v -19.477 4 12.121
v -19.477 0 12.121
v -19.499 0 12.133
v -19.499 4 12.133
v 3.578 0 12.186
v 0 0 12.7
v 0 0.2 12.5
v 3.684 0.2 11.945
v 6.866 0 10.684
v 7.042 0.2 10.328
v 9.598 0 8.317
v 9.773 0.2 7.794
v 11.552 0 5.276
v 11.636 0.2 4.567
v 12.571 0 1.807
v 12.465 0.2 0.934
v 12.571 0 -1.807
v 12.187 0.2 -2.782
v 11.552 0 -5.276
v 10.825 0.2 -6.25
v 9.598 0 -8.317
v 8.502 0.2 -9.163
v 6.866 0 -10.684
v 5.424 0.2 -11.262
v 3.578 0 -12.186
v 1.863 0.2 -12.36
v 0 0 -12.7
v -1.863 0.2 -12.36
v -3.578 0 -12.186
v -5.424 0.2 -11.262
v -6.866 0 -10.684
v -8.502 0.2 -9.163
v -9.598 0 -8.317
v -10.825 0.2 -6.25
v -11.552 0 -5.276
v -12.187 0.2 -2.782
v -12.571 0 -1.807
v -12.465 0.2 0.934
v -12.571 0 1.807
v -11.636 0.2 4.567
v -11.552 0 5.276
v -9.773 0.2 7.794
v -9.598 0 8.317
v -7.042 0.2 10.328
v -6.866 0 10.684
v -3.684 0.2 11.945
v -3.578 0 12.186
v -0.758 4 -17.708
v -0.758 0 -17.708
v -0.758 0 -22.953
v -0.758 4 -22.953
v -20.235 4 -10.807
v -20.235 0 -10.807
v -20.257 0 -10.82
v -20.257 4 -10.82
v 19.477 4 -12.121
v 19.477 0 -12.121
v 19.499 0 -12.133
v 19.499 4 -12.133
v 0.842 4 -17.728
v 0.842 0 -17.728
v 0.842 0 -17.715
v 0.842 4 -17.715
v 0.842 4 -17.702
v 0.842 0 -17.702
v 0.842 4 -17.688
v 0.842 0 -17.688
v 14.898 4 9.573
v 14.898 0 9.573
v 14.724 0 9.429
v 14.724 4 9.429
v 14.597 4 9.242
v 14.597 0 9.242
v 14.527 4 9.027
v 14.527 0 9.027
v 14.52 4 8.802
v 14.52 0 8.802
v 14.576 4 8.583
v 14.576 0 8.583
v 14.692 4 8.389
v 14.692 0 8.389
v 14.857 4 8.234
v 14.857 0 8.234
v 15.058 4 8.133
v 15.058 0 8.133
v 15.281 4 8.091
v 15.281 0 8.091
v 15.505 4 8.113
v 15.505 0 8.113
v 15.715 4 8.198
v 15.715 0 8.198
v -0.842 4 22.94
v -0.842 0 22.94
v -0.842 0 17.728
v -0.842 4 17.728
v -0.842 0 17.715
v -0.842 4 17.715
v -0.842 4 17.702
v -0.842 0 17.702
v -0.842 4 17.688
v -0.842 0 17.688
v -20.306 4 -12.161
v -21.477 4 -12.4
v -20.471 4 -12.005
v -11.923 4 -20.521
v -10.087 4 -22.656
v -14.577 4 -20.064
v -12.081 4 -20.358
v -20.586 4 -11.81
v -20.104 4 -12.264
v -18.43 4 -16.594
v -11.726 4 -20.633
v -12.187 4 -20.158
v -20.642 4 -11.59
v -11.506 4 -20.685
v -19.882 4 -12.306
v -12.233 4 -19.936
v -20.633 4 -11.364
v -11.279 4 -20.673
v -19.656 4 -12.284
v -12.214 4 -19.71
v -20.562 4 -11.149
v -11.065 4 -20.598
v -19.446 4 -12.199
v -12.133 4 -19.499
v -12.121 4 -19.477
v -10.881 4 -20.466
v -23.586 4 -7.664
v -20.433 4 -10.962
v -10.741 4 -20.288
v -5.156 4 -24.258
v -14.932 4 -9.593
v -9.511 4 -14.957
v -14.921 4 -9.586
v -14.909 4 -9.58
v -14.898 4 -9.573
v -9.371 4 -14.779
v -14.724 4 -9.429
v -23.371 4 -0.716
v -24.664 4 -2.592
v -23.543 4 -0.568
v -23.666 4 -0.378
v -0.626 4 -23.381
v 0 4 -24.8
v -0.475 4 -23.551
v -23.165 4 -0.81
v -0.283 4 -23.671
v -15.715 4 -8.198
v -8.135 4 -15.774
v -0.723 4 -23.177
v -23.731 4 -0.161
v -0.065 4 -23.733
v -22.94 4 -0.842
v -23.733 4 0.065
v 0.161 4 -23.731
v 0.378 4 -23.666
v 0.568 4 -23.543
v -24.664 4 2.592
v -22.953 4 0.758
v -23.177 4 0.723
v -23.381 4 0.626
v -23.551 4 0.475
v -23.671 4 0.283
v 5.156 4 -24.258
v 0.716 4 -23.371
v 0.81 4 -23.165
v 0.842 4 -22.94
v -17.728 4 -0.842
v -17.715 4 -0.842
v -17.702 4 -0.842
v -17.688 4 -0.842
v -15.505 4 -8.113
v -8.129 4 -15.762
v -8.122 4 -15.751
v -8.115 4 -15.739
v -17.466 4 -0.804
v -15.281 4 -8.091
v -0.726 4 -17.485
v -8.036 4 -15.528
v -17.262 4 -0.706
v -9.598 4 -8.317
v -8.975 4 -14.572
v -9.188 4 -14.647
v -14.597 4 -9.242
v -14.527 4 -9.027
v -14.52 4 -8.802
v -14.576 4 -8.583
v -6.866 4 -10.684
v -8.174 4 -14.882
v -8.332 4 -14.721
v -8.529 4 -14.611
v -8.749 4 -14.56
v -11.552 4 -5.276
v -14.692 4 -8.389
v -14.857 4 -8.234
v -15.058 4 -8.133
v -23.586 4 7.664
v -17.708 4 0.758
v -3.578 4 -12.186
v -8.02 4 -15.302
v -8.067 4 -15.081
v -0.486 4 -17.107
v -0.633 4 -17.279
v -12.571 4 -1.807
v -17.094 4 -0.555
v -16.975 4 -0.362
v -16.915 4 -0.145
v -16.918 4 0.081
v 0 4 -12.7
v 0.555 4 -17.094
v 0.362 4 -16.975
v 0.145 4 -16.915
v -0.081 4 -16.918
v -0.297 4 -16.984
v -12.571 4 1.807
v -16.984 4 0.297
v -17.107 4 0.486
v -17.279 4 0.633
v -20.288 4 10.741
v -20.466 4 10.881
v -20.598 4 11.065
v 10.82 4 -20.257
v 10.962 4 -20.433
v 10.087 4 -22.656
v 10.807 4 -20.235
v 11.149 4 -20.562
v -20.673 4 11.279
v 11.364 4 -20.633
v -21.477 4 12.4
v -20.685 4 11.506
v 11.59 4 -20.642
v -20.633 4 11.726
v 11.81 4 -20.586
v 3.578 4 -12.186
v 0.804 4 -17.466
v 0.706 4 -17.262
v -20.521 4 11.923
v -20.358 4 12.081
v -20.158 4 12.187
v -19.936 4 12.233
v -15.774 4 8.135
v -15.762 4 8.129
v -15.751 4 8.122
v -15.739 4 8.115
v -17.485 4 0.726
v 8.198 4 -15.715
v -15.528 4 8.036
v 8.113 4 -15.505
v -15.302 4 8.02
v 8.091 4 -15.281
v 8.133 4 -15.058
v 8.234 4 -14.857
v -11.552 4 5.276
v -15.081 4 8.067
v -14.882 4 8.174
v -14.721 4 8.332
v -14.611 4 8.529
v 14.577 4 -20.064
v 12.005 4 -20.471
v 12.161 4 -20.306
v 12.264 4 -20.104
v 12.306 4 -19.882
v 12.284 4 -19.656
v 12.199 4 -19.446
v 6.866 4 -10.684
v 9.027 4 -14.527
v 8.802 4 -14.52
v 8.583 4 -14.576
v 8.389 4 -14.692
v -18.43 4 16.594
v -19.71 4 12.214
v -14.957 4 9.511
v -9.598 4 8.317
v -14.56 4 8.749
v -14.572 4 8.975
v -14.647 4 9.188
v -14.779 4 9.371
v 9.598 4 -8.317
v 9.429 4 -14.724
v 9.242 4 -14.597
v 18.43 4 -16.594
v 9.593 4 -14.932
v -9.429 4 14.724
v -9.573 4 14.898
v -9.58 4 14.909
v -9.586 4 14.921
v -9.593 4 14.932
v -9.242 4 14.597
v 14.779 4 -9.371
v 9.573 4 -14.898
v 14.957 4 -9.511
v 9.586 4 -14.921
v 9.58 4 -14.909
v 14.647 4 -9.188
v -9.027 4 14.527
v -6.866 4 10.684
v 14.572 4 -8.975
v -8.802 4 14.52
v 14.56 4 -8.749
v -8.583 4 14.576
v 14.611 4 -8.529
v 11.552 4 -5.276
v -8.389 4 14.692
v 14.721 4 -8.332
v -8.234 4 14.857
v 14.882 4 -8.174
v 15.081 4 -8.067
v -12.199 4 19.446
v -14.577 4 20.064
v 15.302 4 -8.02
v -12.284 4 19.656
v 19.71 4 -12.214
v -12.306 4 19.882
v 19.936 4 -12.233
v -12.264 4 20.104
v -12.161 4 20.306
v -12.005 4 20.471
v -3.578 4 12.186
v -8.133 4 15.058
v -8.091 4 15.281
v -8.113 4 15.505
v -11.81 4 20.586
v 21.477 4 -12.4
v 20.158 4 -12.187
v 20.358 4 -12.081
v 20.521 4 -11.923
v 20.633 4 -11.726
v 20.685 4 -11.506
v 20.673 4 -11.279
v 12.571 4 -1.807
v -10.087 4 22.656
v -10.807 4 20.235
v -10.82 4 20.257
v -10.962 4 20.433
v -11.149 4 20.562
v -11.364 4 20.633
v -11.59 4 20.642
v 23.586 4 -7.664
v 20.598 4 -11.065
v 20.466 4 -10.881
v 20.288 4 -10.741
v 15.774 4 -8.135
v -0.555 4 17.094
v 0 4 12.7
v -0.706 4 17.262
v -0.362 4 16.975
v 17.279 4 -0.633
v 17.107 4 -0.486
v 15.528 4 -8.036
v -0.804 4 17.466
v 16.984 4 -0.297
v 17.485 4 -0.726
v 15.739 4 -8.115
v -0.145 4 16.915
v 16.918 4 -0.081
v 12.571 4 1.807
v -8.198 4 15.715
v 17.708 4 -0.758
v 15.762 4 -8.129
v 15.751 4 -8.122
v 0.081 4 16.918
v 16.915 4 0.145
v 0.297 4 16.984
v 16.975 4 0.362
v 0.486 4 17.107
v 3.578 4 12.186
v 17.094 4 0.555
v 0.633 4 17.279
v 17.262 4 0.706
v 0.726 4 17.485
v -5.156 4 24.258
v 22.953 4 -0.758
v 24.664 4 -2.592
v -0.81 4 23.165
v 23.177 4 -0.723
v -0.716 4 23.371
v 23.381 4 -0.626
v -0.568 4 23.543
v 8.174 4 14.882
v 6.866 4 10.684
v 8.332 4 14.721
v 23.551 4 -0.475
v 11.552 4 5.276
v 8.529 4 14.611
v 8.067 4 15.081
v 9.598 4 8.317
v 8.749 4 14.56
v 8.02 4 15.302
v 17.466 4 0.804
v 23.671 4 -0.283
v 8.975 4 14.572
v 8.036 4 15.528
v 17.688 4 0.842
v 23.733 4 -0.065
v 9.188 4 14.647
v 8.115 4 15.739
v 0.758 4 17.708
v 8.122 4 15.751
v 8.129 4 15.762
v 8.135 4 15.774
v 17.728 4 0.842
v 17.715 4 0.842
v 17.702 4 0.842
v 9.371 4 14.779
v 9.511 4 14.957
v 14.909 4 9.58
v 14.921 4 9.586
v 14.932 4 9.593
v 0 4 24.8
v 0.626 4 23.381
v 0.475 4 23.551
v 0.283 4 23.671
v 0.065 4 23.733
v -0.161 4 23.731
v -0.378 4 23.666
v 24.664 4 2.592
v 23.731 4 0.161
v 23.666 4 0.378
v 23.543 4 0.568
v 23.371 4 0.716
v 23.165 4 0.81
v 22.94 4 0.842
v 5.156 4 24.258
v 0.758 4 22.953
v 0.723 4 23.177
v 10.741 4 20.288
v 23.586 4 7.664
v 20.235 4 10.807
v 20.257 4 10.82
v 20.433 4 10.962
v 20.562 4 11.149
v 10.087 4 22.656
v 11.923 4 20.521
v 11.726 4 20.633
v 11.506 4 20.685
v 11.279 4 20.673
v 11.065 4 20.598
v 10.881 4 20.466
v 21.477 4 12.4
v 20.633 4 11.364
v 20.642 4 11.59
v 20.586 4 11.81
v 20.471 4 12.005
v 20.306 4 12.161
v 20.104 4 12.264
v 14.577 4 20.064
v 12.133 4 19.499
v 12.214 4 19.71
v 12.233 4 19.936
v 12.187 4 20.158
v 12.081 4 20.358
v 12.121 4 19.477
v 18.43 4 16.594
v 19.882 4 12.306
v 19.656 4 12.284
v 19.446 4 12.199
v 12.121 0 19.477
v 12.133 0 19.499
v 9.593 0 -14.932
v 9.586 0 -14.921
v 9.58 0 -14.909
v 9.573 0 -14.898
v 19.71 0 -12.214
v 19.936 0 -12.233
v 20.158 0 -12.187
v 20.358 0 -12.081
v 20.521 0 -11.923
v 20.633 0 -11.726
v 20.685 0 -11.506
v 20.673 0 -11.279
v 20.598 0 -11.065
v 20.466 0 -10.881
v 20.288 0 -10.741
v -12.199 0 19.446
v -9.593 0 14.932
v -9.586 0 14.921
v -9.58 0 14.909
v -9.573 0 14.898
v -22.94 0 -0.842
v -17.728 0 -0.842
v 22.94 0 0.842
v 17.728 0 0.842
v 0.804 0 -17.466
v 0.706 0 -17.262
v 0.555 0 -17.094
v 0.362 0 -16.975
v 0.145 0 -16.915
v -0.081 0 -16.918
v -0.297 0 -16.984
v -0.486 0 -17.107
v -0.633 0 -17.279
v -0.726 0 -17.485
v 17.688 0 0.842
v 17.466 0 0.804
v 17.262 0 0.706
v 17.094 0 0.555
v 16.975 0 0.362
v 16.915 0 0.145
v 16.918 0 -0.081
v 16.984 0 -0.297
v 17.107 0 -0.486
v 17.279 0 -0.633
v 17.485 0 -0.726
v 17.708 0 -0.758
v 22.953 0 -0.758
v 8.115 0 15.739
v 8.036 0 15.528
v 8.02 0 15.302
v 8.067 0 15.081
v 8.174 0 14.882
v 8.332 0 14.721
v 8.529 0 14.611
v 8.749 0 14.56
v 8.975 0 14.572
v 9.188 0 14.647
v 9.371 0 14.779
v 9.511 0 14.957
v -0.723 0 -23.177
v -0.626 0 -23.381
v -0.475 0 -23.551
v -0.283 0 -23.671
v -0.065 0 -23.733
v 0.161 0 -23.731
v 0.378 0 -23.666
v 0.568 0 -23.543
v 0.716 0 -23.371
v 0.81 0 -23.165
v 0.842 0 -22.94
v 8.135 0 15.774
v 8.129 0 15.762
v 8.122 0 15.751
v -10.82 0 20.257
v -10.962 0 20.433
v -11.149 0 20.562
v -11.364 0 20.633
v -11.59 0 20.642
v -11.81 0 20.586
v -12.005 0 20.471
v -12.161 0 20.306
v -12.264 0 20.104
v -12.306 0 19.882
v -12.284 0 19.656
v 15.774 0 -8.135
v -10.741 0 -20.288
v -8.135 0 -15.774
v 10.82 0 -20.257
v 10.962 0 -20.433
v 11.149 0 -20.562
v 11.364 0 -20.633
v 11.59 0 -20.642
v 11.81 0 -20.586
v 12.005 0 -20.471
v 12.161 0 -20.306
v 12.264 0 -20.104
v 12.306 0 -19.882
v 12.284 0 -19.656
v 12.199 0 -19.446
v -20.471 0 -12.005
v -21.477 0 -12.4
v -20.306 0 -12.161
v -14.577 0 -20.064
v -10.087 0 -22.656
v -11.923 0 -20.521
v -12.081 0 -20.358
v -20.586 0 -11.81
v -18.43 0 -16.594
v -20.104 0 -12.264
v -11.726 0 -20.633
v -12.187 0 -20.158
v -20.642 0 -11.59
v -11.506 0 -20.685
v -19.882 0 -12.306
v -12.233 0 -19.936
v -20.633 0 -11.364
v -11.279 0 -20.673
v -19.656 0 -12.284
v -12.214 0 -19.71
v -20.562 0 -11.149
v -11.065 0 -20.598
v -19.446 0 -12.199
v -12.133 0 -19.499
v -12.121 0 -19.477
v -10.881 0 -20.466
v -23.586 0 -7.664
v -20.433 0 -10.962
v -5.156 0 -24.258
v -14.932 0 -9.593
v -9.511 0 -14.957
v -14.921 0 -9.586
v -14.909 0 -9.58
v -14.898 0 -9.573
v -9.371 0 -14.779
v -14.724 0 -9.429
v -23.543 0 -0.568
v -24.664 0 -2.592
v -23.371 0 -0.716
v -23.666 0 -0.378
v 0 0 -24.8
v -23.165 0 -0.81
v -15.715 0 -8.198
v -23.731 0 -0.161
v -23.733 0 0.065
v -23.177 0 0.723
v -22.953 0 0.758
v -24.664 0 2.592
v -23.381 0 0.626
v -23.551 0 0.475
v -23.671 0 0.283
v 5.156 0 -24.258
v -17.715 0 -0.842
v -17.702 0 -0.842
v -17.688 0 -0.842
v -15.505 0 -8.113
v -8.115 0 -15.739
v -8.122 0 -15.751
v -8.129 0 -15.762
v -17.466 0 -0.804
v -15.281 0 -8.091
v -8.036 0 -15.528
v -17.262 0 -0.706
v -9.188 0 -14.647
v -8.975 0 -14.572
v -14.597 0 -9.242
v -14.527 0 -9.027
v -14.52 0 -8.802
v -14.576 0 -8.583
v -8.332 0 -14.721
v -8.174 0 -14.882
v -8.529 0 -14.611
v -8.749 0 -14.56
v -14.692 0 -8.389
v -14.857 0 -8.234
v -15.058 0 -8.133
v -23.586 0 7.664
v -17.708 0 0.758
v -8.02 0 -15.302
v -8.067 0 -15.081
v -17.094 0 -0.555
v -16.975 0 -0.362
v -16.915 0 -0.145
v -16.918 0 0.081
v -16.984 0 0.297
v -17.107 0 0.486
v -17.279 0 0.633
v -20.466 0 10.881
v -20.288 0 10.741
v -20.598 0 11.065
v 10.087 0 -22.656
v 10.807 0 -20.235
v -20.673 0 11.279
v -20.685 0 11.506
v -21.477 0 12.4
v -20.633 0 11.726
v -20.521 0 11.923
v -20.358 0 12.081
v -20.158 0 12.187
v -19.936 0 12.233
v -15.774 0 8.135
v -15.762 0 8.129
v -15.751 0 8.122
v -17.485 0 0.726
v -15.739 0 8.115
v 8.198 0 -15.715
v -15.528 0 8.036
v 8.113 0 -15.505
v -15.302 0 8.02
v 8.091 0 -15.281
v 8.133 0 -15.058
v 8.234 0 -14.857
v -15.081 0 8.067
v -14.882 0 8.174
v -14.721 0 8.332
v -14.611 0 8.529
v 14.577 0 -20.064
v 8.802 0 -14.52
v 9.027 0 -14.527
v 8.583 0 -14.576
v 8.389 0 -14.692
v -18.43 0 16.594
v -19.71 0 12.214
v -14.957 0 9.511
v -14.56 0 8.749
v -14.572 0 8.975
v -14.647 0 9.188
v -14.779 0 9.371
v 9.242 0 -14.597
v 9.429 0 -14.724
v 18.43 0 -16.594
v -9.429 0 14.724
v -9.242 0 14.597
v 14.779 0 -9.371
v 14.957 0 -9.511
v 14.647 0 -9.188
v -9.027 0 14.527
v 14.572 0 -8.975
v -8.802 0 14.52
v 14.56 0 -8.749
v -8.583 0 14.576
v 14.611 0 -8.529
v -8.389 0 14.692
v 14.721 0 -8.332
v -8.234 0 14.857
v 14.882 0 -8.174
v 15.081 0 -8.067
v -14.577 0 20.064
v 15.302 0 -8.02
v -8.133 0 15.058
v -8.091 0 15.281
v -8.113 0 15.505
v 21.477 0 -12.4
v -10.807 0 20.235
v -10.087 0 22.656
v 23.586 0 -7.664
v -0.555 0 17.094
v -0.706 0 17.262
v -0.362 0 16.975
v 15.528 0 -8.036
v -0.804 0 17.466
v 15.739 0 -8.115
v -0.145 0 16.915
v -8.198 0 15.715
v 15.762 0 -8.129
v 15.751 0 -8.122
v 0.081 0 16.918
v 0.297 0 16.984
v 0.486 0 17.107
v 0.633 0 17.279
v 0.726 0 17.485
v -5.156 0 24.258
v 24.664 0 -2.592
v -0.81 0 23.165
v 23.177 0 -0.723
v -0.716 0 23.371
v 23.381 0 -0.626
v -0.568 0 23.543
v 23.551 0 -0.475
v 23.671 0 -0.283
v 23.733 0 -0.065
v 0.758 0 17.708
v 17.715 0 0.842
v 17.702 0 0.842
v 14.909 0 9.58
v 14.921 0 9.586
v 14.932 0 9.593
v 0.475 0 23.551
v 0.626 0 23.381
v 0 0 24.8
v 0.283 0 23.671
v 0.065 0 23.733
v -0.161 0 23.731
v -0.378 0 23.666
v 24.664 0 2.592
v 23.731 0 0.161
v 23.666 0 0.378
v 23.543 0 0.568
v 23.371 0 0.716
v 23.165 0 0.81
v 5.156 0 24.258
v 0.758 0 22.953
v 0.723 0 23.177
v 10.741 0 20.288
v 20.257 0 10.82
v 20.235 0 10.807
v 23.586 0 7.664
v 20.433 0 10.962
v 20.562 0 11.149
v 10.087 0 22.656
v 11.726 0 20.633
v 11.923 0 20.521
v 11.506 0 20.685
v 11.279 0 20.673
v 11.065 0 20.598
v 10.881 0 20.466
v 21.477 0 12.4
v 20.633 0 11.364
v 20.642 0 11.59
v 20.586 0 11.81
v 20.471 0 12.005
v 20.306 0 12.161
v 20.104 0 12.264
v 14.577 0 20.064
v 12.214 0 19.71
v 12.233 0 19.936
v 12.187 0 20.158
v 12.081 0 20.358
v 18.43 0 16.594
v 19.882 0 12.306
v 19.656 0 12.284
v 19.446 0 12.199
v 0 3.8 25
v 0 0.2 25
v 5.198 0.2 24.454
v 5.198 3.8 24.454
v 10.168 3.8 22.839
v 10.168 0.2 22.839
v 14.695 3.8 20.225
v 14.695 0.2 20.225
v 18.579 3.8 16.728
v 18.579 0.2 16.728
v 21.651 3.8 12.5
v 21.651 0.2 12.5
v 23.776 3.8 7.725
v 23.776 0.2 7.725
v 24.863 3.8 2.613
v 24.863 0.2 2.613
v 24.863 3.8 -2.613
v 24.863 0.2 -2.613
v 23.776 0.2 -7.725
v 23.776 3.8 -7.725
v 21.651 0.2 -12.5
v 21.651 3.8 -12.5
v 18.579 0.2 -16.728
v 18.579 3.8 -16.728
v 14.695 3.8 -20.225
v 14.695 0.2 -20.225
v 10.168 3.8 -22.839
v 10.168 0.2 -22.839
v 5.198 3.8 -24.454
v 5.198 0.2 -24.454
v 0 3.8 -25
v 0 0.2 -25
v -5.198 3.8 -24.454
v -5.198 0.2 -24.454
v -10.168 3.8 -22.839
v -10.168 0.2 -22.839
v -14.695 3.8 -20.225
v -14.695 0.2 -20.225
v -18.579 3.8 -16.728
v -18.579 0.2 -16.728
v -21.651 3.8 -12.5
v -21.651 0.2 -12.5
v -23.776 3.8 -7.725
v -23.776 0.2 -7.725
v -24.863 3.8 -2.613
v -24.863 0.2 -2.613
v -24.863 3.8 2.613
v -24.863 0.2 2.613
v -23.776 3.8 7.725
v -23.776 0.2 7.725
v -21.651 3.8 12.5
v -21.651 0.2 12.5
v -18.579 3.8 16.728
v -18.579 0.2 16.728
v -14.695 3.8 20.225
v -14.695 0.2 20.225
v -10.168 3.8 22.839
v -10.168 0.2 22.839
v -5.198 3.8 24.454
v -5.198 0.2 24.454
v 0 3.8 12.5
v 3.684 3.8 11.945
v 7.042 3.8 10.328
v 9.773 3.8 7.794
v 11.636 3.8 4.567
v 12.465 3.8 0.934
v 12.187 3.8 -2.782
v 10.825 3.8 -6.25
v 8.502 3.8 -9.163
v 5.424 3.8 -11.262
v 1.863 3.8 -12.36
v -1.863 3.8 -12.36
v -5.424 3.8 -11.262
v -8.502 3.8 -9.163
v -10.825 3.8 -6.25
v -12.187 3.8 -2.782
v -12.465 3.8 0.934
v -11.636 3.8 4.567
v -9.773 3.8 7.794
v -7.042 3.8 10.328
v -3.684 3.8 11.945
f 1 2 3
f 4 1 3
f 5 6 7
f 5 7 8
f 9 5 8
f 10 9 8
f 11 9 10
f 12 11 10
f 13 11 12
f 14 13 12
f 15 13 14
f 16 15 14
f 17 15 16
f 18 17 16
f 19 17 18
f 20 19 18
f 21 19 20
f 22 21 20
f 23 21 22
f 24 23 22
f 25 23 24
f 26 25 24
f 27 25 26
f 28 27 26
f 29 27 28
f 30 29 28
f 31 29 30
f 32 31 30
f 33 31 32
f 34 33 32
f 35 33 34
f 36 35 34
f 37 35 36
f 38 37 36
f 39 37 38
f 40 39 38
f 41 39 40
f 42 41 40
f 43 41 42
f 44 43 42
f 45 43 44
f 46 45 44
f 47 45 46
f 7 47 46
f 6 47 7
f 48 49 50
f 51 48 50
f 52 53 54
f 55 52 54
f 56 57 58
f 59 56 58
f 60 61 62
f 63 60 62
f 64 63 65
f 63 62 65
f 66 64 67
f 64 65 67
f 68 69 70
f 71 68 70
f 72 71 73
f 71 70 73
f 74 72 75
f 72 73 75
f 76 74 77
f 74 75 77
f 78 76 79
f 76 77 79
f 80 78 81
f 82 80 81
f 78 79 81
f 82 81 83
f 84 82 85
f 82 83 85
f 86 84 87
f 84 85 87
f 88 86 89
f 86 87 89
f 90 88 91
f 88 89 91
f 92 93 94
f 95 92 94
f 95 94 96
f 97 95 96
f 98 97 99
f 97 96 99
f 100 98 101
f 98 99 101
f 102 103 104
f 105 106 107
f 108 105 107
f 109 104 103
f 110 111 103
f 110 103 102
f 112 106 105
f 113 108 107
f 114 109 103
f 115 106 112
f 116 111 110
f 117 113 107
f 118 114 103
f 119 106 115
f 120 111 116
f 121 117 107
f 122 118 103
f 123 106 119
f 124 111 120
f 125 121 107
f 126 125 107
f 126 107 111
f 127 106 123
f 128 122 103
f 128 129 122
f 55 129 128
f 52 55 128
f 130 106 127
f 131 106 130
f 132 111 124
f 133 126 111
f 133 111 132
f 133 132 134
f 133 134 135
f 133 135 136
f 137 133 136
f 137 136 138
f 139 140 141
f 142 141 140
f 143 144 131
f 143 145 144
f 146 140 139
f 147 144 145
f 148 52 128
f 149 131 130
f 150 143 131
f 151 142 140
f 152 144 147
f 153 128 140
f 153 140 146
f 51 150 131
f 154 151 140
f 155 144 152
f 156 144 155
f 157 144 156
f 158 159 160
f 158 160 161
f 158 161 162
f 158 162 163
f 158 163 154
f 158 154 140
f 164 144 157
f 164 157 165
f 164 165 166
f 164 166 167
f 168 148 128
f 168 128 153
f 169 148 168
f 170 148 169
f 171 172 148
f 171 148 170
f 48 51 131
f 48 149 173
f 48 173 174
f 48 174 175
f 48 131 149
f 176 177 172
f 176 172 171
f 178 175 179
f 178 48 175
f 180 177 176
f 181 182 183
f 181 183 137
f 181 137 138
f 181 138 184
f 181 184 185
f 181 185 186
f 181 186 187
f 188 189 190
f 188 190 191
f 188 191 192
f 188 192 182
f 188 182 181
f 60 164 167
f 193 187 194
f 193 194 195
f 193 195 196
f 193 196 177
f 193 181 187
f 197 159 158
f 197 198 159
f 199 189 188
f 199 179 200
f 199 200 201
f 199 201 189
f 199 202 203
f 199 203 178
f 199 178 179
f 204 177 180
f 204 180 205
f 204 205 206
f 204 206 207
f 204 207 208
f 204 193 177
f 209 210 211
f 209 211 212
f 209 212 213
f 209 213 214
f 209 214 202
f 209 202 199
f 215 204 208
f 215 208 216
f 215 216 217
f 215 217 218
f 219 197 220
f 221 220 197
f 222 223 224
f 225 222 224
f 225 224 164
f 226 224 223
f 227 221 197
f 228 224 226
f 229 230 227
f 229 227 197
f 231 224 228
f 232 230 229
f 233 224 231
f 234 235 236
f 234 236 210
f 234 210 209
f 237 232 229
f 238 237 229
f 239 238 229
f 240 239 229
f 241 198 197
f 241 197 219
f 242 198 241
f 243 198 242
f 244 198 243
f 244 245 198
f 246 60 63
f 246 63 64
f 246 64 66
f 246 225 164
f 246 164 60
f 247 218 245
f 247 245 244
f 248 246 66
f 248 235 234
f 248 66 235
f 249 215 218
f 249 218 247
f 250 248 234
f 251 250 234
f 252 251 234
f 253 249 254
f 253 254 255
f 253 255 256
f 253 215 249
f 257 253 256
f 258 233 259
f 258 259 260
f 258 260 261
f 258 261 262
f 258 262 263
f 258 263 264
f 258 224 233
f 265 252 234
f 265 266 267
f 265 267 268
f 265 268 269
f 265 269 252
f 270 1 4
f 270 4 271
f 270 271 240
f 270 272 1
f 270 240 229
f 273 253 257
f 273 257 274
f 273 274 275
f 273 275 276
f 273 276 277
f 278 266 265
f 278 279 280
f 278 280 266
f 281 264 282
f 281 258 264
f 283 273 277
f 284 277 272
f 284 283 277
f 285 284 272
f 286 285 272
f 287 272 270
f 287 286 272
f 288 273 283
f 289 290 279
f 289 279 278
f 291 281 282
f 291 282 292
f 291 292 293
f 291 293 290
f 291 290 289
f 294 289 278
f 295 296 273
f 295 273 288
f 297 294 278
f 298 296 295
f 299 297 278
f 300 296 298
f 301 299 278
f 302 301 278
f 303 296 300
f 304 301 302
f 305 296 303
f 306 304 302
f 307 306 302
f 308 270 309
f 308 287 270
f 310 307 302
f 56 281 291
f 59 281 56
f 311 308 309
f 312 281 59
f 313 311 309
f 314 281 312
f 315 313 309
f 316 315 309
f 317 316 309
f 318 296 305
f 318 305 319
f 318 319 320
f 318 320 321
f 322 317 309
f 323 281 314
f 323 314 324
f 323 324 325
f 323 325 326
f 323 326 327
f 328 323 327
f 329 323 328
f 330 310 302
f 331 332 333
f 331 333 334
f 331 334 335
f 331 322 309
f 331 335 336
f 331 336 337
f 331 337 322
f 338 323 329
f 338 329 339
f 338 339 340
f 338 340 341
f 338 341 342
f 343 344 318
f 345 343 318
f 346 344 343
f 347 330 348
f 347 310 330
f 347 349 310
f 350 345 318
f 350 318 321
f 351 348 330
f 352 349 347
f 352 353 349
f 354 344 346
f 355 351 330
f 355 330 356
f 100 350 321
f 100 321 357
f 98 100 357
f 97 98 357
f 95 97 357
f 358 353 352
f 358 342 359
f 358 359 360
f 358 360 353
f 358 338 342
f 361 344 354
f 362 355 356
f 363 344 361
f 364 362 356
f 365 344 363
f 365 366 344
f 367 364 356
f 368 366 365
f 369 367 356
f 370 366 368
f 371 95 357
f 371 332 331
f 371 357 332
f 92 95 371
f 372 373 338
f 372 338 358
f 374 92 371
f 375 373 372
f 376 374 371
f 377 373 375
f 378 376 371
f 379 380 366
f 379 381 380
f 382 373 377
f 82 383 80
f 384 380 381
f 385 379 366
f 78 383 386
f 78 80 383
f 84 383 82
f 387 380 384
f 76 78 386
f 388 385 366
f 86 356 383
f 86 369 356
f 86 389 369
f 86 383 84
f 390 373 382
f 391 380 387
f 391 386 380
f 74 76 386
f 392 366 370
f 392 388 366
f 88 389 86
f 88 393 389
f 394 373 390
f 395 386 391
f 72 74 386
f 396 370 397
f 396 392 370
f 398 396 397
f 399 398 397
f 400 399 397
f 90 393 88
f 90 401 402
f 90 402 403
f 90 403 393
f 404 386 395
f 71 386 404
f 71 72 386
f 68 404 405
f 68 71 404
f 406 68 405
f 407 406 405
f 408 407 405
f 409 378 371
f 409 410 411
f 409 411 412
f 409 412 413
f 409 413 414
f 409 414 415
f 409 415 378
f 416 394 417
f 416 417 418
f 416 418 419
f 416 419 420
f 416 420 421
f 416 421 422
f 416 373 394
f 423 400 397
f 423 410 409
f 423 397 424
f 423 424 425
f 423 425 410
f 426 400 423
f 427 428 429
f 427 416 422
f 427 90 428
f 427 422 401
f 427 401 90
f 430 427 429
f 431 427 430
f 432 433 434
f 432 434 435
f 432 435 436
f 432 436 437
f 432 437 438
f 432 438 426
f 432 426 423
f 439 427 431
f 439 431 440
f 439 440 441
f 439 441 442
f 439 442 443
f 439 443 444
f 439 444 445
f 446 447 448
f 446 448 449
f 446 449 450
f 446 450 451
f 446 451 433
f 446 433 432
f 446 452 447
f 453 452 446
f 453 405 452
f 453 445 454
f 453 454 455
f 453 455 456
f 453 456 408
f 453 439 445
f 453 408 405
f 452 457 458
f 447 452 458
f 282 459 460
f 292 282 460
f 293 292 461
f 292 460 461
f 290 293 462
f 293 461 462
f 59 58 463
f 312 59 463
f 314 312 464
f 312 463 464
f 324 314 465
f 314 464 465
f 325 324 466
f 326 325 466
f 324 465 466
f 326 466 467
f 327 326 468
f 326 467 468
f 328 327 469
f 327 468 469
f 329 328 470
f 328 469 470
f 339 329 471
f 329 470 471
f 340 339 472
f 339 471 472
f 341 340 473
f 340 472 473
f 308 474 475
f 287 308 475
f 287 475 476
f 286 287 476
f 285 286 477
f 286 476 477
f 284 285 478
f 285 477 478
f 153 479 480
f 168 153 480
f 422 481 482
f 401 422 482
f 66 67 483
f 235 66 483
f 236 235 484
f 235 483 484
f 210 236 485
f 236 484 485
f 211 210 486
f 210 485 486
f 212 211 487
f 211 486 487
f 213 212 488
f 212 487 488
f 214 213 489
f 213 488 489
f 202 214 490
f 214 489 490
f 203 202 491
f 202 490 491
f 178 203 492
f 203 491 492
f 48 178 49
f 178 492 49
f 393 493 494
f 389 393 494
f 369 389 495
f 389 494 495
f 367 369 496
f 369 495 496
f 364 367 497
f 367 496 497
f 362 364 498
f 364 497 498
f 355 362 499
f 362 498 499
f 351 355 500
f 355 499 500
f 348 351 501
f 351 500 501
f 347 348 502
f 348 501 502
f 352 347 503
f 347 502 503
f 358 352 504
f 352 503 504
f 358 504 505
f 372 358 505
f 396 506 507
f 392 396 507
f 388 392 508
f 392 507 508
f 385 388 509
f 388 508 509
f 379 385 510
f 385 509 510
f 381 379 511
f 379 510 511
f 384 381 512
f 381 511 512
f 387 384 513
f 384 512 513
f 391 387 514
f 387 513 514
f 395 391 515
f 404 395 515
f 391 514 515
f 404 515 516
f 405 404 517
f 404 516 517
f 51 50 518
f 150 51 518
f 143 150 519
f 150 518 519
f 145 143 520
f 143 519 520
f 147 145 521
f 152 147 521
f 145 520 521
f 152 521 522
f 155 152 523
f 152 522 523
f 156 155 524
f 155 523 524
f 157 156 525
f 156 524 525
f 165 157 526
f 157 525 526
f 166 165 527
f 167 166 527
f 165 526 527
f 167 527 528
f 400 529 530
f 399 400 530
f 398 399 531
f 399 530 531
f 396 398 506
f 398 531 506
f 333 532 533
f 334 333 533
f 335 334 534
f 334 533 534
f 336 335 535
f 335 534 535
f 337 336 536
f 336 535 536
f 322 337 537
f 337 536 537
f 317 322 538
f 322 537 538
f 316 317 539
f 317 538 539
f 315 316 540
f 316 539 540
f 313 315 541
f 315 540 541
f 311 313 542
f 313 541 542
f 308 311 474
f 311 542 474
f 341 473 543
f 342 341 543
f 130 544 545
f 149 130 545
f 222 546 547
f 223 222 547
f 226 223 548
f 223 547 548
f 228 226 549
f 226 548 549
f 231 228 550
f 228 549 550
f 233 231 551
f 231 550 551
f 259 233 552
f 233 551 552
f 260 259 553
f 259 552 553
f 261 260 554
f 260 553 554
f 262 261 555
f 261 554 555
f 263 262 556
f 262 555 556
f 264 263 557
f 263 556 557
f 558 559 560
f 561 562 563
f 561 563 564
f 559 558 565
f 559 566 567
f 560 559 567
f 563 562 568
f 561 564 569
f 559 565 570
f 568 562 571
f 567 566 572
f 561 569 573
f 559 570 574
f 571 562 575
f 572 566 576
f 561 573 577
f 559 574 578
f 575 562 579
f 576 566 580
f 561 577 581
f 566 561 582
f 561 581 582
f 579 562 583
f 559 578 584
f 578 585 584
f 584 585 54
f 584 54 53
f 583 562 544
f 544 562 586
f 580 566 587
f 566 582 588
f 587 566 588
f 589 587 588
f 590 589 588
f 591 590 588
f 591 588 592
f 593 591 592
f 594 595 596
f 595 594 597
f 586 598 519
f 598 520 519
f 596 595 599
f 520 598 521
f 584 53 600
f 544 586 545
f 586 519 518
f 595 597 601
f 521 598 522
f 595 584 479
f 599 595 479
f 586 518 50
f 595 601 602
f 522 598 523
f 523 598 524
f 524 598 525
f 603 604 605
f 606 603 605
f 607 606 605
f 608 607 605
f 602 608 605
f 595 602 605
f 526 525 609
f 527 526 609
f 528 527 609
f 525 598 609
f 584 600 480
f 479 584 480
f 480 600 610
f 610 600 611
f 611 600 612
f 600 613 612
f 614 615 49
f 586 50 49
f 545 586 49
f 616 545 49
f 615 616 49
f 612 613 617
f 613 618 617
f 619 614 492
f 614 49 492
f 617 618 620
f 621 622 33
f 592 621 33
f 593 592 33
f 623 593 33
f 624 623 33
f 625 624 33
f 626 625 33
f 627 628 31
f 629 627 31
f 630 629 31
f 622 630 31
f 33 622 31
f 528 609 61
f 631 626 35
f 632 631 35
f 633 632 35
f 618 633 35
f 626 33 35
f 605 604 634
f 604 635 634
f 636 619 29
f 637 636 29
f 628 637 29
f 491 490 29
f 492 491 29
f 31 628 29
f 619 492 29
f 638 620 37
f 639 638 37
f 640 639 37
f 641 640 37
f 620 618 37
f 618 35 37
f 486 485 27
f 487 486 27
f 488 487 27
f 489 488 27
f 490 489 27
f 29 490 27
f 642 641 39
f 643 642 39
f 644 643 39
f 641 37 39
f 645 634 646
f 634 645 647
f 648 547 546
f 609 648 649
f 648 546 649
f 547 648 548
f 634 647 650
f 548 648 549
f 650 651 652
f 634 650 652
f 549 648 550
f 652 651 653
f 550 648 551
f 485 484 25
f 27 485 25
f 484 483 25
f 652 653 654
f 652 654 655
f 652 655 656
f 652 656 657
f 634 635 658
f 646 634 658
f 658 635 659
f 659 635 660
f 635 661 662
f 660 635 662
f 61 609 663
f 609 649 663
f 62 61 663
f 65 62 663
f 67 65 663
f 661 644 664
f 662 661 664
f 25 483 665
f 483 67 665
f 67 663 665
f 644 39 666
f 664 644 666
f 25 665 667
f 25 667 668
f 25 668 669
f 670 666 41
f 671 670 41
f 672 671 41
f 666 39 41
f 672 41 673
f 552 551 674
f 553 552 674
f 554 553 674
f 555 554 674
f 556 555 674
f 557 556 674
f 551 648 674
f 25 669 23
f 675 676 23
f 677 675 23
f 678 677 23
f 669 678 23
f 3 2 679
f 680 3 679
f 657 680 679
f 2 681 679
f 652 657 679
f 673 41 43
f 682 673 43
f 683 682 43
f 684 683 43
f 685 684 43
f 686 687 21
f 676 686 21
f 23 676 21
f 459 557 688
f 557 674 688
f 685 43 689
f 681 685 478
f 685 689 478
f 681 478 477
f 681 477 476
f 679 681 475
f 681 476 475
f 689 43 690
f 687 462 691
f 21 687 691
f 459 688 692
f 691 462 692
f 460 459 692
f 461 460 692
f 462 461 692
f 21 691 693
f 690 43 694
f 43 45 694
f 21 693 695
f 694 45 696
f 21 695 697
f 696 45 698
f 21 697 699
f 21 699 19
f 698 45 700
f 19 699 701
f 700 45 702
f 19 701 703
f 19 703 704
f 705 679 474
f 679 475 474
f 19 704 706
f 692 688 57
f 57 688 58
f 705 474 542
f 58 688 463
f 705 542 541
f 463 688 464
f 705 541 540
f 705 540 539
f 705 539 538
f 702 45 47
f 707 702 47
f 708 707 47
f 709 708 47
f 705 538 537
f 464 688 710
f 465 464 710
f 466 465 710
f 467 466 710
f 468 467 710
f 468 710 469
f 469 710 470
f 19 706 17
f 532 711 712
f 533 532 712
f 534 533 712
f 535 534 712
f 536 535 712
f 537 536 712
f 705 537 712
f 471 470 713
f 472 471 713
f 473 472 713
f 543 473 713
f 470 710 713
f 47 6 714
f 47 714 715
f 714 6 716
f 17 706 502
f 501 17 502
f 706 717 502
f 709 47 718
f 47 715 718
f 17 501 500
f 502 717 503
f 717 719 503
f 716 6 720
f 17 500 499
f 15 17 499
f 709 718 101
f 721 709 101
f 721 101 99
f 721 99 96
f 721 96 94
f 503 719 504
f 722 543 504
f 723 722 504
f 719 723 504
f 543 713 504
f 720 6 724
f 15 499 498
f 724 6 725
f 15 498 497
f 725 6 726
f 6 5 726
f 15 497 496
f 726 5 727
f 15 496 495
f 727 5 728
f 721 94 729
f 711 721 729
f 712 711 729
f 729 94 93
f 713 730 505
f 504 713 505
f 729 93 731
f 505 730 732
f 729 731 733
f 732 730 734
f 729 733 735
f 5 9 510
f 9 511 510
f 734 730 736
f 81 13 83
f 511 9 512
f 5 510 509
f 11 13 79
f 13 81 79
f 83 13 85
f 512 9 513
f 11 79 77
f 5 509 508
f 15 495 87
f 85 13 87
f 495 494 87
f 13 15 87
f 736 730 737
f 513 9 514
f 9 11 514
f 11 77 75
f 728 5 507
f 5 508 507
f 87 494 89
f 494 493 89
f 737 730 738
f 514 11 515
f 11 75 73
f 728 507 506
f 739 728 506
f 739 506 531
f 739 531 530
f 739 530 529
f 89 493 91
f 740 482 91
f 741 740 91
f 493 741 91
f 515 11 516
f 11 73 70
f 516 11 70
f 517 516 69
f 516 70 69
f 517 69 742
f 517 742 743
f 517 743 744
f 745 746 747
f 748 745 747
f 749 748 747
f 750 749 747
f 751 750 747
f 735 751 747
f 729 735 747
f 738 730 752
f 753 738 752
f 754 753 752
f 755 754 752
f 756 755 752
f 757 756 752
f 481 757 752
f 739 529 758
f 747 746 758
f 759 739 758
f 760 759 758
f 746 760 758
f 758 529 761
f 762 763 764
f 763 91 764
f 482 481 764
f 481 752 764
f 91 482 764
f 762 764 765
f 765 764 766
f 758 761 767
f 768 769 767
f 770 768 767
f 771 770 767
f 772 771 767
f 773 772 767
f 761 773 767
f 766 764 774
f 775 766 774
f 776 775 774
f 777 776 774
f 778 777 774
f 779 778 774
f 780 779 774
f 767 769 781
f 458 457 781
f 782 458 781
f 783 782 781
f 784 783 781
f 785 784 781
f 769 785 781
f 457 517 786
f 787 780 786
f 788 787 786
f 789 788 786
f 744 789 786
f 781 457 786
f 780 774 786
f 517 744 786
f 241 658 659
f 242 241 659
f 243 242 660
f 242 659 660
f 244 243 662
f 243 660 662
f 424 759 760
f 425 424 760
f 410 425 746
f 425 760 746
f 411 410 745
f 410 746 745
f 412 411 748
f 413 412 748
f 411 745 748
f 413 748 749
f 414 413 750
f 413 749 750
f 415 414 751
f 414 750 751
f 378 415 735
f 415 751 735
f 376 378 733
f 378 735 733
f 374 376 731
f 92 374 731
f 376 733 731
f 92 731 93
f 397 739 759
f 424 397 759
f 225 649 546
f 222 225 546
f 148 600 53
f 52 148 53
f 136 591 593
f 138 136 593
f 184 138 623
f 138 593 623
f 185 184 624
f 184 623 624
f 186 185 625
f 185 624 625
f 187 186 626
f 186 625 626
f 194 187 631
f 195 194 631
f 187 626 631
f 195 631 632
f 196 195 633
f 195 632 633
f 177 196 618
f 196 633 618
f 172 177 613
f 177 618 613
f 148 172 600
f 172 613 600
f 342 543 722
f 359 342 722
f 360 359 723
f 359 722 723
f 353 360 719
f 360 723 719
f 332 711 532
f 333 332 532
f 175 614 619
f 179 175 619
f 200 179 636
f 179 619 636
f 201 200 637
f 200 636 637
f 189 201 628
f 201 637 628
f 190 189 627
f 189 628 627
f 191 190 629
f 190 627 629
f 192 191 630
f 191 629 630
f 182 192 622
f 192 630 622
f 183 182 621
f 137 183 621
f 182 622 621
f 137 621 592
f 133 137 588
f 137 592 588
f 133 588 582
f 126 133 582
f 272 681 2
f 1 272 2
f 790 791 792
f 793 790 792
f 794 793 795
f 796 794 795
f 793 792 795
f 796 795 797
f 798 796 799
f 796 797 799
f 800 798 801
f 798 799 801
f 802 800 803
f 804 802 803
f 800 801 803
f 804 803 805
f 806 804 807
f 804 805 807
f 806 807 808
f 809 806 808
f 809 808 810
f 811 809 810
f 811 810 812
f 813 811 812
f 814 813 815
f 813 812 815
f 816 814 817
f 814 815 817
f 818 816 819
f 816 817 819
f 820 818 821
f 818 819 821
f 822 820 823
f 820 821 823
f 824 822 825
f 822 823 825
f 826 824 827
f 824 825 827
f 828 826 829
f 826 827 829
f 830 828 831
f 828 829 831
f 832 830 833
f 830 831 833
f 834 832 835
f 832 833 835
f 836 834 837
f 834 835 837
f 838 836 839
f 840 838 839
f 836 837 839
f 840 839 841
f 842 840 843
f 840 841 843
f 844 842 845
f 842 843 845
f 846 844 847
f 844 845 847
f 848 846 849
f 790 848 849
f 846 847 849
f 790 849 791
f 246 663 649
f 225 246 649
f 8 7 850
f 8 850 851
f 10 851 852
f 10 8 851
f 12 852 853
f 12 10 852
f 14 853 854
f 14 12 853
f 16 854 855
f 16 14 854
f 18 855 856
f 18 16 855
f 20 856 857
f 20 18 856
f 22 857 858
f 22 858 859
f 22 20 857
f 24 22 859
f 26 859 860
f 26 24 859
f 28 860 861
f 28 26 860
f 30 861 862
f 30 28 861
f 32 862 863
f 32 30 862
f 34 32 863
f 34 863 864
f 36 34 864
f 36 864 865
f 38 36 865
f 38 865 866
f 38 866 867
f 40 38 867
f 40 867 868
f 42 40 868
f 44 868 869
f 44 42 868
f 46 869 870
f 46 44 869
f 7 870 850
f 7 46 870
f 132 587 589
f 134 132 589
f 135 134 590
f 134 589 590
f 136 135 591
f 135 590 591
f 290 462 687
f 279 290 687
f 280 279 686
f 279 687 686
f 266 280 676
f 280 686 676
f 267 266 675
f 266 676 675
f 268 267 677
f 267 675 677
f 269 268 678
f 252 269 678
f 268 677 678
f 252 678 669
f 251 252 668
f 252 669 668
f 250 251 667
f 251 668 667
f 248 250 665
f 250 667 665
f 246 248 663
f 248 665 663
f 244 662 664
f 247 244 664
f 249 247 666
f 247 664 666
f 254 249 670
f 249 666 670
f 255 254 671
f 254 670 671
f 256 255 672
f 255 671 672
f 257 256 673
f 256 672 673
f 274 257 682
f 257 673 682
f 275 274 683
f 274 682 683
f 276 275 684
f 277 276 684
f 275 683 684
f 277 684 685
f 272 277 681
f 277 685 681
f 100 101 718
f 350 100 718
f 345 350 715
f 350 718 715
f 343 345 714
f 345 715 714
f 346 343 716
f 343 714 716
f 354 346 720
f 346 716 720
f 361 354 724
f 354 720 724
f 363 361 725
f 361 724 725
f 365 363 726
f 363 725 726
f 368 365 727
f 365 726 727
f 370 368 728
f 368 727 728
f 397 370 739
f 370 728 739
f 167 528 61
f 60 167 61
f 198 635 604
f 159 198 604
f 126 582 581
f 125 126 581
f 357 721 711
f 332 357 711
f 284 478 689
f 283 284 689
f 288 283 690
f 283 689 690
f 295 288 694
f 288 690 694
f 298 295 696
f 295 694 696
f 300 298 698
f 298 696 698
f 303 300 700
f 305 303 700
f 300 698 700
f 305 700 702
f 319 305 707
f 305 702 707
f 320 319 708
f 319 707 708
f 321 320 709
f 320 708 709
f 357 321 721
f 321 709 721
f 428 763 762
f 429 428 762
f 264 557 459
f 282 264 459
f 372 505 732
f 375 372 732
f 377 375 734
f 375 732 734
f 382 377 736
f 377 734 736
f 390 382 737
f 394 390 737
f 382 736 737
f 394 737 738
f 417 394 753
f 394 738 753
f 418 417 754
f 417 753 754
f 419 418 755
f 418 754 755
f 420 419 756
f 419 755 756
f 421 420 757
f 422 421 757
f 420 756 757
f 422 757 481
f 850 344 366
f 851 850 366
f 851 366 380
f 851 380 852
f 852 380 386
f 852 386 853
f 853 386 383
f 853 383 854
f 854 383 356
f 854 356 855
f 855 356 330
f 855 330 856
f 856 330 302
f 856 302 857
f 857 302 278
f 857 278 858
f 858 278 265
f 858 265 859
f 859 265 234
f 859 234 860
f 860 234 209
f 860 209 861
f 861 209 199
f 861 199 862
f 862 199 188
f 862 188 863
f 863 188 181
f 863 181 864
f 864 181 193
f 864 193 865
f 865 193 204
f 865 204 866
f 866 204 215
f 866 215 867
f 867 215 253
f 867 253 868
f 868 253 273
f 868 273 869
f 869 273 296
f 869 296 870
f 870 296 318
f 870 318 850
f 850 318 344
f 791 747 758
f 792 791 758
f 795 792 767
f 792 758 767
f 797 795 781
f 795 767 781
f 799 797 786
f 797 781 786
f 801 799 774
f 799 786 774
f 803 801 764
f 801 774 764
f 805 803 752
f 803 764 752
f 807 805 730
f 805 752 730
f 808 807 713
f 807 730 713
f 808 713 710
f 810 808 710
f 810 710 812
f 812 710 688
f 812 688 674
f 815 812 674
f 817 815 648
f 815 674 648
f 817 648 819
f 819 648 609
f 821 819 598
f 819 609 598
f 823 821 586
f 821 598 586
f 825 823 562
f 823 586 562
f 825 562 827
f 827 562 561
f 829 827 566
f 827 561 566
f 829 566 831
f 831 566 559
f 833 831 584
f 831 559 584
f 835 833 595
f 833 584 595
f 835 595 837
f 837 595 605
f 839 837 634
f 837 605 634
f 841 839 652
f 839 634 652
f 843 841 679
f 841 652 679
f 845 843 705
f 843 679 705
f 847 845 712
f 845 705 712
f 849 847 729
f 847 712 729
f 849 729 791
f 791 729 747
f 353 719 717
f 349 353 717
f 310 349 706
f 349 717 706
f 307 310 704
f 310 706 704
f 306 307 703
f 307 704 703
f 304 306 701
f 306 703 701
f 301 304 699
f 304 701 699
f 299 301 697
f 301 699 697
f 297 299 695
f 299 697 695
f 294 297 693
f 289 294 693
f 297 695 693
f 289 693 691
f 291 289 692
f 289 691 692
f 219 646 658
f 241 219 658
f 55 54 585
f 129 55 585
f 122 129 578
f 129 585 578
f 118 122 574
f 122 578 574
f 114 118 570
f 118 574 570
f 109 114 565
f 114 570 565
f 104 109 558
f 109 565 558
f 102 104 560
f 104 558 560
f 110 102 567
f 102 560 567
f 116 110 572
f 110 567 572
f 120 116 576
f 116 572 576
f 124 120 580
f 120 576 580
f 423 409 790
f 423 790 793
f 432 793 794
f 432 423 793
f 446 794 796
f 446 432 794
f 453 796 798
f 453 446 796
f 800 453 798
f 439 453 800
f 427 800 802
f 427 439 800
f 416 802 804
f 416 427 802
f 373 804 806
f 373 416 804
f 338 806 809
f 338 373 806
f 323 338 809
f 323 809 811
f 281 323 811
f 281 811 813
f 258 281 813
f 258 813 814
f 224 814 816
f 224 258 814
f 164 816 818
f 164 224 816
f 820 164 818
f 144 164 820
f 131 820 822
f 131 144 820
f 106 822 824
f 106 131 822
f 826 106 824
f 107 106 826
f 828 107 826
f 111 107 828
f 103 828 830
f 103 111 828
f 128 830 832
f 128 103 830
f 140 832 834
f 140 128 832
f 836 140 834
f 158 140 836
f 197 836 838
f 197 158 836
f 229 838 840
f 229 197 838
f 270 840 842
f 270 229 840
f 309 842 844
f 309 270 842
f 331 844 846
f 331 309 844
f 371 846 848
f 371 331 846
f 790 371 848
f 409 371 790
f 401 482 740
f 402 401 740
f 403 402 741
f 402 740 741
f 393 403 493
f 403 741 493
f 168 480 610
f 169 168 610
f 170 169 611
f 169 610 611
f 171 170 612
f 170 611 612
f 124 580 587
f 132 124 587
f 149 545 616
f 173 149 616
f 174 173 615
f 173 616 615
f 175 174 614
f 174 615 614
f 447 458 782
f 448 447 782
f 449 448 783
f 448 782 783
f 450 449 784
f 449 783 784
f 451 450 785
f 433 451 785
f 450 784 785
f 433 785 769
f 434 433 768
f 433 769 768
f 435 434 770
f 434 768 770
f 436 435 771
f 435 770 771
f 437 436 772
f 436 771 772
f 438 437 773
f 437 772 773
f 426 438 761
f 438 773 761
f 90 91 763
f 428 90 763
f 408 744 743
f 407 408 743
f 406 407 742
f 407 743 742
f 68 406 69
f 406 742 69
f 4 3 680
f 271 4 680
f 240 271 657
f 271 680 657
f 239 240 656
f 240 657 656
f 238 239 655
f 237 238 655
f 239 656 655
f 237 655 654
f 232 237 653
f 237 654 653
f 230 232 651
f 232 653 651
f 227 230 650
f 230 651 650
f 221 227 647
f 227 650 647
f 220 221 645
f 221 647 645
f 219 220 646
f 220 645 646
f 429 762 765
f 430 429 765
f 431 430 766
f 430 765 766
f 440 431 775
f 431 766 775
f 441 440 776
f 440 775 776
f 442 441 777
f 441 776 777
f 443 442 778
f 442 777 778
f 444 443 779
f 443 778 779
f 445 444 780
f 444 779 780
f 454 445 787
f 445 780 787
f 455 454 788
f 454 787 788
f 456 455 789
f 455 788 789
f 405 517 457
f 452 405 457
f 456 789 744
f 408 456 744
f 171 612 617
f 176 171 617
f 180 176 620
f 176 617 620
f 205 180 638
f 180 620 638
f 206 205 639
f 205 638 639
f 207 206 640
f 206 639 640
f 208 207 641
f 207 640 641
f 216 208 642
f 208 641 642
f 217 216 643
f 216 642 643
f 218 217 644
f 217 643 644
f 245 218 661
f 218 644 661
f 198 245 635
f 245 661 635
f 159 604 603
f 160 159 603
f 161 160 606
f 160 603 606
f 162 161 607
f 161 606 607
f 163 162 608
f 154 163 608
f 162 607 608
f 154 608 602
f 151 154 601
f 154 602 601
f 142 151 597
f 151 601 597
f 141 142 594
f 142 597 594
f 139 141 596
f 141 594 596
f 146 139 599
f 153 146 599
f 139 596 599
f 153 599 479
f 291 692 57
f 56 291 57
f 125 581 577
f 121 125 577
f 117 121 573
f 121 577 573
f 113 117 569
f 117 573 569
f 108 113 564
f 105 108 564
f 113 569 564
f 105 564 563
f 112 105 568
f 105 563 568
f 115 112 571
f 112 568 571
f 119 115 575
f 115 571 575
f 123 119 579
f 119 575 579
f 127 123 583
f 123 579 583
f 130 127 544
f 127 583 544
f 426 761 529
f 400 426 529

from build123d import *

# Parameters (mm, degrees)
SKETCH1_R           = 25
SKETCH1_R_2         = 12.5
BOSS_EXTRUDE1_DEPTH = 4
CHAMFER1_SIZE       = 0.2


with BuildPart() as part:
    # Sketch1 → Boss-Extrude1 (new body)
    with BuildSketch(Plane(origin=(0, 0, 0), x_dir=(1, 0, 0), z_dir=(0, 1, 0))):
        with Locations(Location((0, 0, 0), (0, 0, 270))):
            Circle(SKETCH1_R)
        with BuildLine():
            ThreePointArc((0.758245274, -22.952787235), (-0.048003188, -23.74036389), (-0.841852323, -22.940290693))
            Line((-0.841852323, -22.940290693), (-0.841508405, -17.728184123))
            ThreePointArc((-0.841508405, -17.728184123), (-0.841754725, -17.708280546), (-0.841505778, -17.688377001))
            ThreePointArc((-0.841505778, -17.688377001), (-0.031775784, -16.908395573), (0.758245274, -17.708333333))
            Line((0.758245274, -17.708333333), (0.758245274, -22.927794152))
            Line((0.758245274, -22.927794152), (0.758245274, -22.952787235))
        make_face(mode=Mode.SUBTRACT)
        with BuildLine():
            ThreePointArc((-10.819733948, -20.25681947), (-11.911753925, -20.53575663), (-12.199210844, -19.445948349))
            Line((-12.199210844, -19.445948349), (-9.592859718, -14.932303611))
            ThreePointArc((-9.592859718, -14.932303611), (-9.583121248, -14.914943448), (-9.572953882, -14.897830945))
            ThreePointArc((-9.572953882, -14.897830945), (-8.481716422, -14.627212211), (-8.197506997, -15.714989162))
            Line((-8.197506997, -15.714989162), (-10.807237407, -20.235174825))
            Line((-10.807237407, -20.235174825), (-10.819733948, -20.25681947))
        make_face(mode=Mode.SUBTRACT)
        with BuildLine():
            ThreePointArc((-19.498574197, -12.133053287), (-20.583759818, -11.828609965), (-20.287800672, -10.741079849))
            Line((-20.287800672, -10.741079849), (-15.773812016, -8.135324406))
            ThreePointArc((-15.773812016, -8.135324406), (-15.756698172, -8.125159298), (-15.739336724, -8.115423119))
            ThreePointArc((-15.739336724, -8.115423119), (-14.658987995, -8.42667915), (-14.956743889, -9.510826336))
            Line((-14.956743889, -9.510826336), (-19.476929551, -12.120556745))
            Line((-19.476929551, -12.120556745), (-19.498574197, -12.133053287))
        make_face(mode=Mode.SUBTRACT)
        with BuildLine():
            ThreePointArc((12.133053287, -19.498574197), (11.828609965, -20.583759818), (10.741079849, -20.287800672))
            Line((10.741079849, -20.287800672), (8.135324406, -15.773812016))
            ThreePointArc((8.135324406, -15.773812016), (8.125159298, -15.756698172), (8.115423119, -15.739336724))
            ThreePointArc((8.115423119, -15.739336724), (8.42667915, -14.658987995), (9.510826336, -14.956743889))
            Line((9.510826336, -14.956743889), (12.120556745, -19.476929551))
            Line((12.120556745, -19.476929551), (12.133053287, -19.498574197))
        make_face(mode=Mode.SUBTRACT)
        with BuildLine():
            ThreePointArc((20.25681947, -10.819733948), (20.53575663, -11.911753925), (19.445948349, -12.199210844))
            Line((19.445948349, -12.199210844), (14.932303611, -9.592859718))
            ThreePointArc((14.932303611, -9.592859718), (14.914943448, -9.583121248), (14.897830945, -9.572953882))
            ThreePointArc((14.897830945, -9.572953882), (14.627212211, -8.481716422), (15.714989162, -8.197506997))
            Line((15.714989162, -8.197506997), (20.235174825, -10.807237407))
            Line((20.235174825, -10.807237407), (20.25681947, -10.819733948))
        make_face(mode=Mode.SUBTRACT)
        with BuildLine():
            ThreePointArc((22.952787235, 0.758245274), (23.74036389, -0.048003188), (22.940290693, -0.841852323))
            Line((22.940290693, -0.841852323), (17.728184123, -0.841508405))
            ThreePointArc((17.728184123, -0.841508405), (17.708280546, -0.841754725), (17.688377001, -0.841505778))
            ThreePointArc((17.688377001, -0.841505778), (16.908395573, -0.031775784), (17.708333333, 0.758245274))
            Line((17.708333333, 0.758245274), (22.927794152, 0.758245274))
            Line((22.927794152, 0.758245274), (22.952787235, 0.758245274))
        make_face(mode=Mode.SUBTRACT)
        with BuildLine():
            ThreePointArc((-22.952787235, -0.758245274), (-23.74036389, 0.048003188), (-22.940290693, 0.841852323))
            Line((-22.940290693, 0.841852323), (-17.728184123, 0.841508405))
            ThreePointArc((-17.728184123, 0.841508405), (-17.708280546, 0.841754725), (-17.688377001, 0.841505778))
            ThreePointArc((-17.688377001, 0.841505778), (-16.908395573, 0.031775784), (-17.708333333, -0.758245274))
            Line((-17.708333333, -0.758245274), (-22.927794152, -0.758245274))
            Line((-22.927794152, -0.758245274), (-22.952787235, -0.758245274))
        make_face(mode=Mode.SUBTRACT)
        with BuildLine():
            ThreePointArc((-20.25681947, 10.819733948), (-20.53575663, 11.911753925), (-19.445948349, 12.199210844))
            Line((-19.445948349, 12.199210844), (-14.932303611, 9.592859718))
            ThreePointArc((-14.932303611, 9.592859718), (-14.914943448, 9.583121248), (-14.897830945, 9.572953882))
            ThreePointArc((-14.897830945, 9.572953882), (-14.627212211, 8.481716422), (-15.714989162, 8.197506997))
            Line((-15.714989162, 8.197506997), (-20.235174825, 10.807237407))
            Line((-20.235174825, 10.807237407), (-20.25681947, 10.819733948))
        make_face(mode=Mode.SUBTRACT)
        with Locations(Location((0, 0, 0), (0, 0, 270))):
            Circle(SKETCH1_R_2, mode=Mode.SUBTRACT)
        with BuildLine():
            ThreePointArc((-12.133053287, 19.498574197), (-11.828609965, 20.583759818), (-10.741079849, 20.287800672))
            Line((-10.741079849, 20.287800672), (-8.135324406, 15.773812016))
            ThreePointArc((-8.135324406, 15.773812016), (-8.125159298, 15.756698172), (-8.115423119, 15.739336724))
            ThreePointArc((-8.115423119, 15.739336724), (-8.42667915, 14.658987995), (-9.510826336, 14.956743889))
            Line((-9.510826336, 14.956743889), (-12.120556745, 19.476929551))
            Line((-12.120556745, 19.476929551), (-12.133053287, 19.498574197))
        make_face(mode=Mode.SUBTRACT)
        with BuildLine():
            ThreePointArc((19.498574197, 12.133053287), (20.583759818, 11.828609965), (20.287800672, 10.741079849))
            Line((20.287800672, 10.741079849), (15.773812016, 8.135324406))
            ThreePointArc((15.773812016, 8.135324406), (15.756698172, 8.125159298), (15.739336724, 8.115423119))
            ThreePointArc((15.739336724, 8.115423119), (14.658987995, 8.42667915), (14.956743889, 9.510826336))
            Line((14.956743889, 9.510826336), (19.476929551, 12.120556745))
            Line((19.476929551, 12.120556745), (19.498574197, 12.133053287))
        make_face(mode=Mode.SUBTRACT)
        with BuildLine():
            ThreePointArc((10.819733948, 20.25681947), (11.911753925, 20.53575663), (12.199210844, 19.445948349))
            Line((12.199210844, 19.445948349), (9.592859718, 14.932303611))
            ThreePointArc((9.592859718, 14.932303611), (9.583121248, 14.914943448), (9.572953882, 14.897830945))
            ThreePointArc((9.572953882, 14.897830945), (8.481716422, 14.627212211), (8.197506997, 15.714989162))
            Line((8.197506997, 15.714989162), (10.807237407, 20.235174825))
            Line((10.807237407, 20.235174825), (10.819733948, 20.25681947))
        make_face(mode=Mode.SUBTRACT)
        with BuildLine():
            ThreePointArc((0.841505778, 17.688377001), (0.031775784, 16.908395573), (-0.758245274, 17.708333333))
            Line((-0.758245274, 17.708333333), (-0.758245274, 22.927794152))
            Line((-0.758245274, 22.927794152), (-0.758245274, 22.952787235))
            ThreePointArc((-0.758245274, 22.952787235), (0.048003188, 23.74036389), (0.841852323, 22.940290693))
            Line((0.841852323, 22.940290693), (0.841508405, 17.728184123))
            ThreePointArc((0.841508405, 17.728184123), (0.841754725, 17.708280546), (0.841505778, 17.688377001))
        make_face(mode=Mode.SUBTRACT)
    extrude(amount=BOSS_EXTRUDE1_DEPTH)

    # Chamfer1
    chamfer1_edges = [part.edges().sort_by_distance(p)[0] for p in [
        (0, 4, -12.5),
        (0, 4, -25),
        (0, 0, -25),
        (0, 0, -12.5),
    ]]
    chamfer(chamfer1_edges, length=CHAMFER1_SIZE)


solid = part.part
